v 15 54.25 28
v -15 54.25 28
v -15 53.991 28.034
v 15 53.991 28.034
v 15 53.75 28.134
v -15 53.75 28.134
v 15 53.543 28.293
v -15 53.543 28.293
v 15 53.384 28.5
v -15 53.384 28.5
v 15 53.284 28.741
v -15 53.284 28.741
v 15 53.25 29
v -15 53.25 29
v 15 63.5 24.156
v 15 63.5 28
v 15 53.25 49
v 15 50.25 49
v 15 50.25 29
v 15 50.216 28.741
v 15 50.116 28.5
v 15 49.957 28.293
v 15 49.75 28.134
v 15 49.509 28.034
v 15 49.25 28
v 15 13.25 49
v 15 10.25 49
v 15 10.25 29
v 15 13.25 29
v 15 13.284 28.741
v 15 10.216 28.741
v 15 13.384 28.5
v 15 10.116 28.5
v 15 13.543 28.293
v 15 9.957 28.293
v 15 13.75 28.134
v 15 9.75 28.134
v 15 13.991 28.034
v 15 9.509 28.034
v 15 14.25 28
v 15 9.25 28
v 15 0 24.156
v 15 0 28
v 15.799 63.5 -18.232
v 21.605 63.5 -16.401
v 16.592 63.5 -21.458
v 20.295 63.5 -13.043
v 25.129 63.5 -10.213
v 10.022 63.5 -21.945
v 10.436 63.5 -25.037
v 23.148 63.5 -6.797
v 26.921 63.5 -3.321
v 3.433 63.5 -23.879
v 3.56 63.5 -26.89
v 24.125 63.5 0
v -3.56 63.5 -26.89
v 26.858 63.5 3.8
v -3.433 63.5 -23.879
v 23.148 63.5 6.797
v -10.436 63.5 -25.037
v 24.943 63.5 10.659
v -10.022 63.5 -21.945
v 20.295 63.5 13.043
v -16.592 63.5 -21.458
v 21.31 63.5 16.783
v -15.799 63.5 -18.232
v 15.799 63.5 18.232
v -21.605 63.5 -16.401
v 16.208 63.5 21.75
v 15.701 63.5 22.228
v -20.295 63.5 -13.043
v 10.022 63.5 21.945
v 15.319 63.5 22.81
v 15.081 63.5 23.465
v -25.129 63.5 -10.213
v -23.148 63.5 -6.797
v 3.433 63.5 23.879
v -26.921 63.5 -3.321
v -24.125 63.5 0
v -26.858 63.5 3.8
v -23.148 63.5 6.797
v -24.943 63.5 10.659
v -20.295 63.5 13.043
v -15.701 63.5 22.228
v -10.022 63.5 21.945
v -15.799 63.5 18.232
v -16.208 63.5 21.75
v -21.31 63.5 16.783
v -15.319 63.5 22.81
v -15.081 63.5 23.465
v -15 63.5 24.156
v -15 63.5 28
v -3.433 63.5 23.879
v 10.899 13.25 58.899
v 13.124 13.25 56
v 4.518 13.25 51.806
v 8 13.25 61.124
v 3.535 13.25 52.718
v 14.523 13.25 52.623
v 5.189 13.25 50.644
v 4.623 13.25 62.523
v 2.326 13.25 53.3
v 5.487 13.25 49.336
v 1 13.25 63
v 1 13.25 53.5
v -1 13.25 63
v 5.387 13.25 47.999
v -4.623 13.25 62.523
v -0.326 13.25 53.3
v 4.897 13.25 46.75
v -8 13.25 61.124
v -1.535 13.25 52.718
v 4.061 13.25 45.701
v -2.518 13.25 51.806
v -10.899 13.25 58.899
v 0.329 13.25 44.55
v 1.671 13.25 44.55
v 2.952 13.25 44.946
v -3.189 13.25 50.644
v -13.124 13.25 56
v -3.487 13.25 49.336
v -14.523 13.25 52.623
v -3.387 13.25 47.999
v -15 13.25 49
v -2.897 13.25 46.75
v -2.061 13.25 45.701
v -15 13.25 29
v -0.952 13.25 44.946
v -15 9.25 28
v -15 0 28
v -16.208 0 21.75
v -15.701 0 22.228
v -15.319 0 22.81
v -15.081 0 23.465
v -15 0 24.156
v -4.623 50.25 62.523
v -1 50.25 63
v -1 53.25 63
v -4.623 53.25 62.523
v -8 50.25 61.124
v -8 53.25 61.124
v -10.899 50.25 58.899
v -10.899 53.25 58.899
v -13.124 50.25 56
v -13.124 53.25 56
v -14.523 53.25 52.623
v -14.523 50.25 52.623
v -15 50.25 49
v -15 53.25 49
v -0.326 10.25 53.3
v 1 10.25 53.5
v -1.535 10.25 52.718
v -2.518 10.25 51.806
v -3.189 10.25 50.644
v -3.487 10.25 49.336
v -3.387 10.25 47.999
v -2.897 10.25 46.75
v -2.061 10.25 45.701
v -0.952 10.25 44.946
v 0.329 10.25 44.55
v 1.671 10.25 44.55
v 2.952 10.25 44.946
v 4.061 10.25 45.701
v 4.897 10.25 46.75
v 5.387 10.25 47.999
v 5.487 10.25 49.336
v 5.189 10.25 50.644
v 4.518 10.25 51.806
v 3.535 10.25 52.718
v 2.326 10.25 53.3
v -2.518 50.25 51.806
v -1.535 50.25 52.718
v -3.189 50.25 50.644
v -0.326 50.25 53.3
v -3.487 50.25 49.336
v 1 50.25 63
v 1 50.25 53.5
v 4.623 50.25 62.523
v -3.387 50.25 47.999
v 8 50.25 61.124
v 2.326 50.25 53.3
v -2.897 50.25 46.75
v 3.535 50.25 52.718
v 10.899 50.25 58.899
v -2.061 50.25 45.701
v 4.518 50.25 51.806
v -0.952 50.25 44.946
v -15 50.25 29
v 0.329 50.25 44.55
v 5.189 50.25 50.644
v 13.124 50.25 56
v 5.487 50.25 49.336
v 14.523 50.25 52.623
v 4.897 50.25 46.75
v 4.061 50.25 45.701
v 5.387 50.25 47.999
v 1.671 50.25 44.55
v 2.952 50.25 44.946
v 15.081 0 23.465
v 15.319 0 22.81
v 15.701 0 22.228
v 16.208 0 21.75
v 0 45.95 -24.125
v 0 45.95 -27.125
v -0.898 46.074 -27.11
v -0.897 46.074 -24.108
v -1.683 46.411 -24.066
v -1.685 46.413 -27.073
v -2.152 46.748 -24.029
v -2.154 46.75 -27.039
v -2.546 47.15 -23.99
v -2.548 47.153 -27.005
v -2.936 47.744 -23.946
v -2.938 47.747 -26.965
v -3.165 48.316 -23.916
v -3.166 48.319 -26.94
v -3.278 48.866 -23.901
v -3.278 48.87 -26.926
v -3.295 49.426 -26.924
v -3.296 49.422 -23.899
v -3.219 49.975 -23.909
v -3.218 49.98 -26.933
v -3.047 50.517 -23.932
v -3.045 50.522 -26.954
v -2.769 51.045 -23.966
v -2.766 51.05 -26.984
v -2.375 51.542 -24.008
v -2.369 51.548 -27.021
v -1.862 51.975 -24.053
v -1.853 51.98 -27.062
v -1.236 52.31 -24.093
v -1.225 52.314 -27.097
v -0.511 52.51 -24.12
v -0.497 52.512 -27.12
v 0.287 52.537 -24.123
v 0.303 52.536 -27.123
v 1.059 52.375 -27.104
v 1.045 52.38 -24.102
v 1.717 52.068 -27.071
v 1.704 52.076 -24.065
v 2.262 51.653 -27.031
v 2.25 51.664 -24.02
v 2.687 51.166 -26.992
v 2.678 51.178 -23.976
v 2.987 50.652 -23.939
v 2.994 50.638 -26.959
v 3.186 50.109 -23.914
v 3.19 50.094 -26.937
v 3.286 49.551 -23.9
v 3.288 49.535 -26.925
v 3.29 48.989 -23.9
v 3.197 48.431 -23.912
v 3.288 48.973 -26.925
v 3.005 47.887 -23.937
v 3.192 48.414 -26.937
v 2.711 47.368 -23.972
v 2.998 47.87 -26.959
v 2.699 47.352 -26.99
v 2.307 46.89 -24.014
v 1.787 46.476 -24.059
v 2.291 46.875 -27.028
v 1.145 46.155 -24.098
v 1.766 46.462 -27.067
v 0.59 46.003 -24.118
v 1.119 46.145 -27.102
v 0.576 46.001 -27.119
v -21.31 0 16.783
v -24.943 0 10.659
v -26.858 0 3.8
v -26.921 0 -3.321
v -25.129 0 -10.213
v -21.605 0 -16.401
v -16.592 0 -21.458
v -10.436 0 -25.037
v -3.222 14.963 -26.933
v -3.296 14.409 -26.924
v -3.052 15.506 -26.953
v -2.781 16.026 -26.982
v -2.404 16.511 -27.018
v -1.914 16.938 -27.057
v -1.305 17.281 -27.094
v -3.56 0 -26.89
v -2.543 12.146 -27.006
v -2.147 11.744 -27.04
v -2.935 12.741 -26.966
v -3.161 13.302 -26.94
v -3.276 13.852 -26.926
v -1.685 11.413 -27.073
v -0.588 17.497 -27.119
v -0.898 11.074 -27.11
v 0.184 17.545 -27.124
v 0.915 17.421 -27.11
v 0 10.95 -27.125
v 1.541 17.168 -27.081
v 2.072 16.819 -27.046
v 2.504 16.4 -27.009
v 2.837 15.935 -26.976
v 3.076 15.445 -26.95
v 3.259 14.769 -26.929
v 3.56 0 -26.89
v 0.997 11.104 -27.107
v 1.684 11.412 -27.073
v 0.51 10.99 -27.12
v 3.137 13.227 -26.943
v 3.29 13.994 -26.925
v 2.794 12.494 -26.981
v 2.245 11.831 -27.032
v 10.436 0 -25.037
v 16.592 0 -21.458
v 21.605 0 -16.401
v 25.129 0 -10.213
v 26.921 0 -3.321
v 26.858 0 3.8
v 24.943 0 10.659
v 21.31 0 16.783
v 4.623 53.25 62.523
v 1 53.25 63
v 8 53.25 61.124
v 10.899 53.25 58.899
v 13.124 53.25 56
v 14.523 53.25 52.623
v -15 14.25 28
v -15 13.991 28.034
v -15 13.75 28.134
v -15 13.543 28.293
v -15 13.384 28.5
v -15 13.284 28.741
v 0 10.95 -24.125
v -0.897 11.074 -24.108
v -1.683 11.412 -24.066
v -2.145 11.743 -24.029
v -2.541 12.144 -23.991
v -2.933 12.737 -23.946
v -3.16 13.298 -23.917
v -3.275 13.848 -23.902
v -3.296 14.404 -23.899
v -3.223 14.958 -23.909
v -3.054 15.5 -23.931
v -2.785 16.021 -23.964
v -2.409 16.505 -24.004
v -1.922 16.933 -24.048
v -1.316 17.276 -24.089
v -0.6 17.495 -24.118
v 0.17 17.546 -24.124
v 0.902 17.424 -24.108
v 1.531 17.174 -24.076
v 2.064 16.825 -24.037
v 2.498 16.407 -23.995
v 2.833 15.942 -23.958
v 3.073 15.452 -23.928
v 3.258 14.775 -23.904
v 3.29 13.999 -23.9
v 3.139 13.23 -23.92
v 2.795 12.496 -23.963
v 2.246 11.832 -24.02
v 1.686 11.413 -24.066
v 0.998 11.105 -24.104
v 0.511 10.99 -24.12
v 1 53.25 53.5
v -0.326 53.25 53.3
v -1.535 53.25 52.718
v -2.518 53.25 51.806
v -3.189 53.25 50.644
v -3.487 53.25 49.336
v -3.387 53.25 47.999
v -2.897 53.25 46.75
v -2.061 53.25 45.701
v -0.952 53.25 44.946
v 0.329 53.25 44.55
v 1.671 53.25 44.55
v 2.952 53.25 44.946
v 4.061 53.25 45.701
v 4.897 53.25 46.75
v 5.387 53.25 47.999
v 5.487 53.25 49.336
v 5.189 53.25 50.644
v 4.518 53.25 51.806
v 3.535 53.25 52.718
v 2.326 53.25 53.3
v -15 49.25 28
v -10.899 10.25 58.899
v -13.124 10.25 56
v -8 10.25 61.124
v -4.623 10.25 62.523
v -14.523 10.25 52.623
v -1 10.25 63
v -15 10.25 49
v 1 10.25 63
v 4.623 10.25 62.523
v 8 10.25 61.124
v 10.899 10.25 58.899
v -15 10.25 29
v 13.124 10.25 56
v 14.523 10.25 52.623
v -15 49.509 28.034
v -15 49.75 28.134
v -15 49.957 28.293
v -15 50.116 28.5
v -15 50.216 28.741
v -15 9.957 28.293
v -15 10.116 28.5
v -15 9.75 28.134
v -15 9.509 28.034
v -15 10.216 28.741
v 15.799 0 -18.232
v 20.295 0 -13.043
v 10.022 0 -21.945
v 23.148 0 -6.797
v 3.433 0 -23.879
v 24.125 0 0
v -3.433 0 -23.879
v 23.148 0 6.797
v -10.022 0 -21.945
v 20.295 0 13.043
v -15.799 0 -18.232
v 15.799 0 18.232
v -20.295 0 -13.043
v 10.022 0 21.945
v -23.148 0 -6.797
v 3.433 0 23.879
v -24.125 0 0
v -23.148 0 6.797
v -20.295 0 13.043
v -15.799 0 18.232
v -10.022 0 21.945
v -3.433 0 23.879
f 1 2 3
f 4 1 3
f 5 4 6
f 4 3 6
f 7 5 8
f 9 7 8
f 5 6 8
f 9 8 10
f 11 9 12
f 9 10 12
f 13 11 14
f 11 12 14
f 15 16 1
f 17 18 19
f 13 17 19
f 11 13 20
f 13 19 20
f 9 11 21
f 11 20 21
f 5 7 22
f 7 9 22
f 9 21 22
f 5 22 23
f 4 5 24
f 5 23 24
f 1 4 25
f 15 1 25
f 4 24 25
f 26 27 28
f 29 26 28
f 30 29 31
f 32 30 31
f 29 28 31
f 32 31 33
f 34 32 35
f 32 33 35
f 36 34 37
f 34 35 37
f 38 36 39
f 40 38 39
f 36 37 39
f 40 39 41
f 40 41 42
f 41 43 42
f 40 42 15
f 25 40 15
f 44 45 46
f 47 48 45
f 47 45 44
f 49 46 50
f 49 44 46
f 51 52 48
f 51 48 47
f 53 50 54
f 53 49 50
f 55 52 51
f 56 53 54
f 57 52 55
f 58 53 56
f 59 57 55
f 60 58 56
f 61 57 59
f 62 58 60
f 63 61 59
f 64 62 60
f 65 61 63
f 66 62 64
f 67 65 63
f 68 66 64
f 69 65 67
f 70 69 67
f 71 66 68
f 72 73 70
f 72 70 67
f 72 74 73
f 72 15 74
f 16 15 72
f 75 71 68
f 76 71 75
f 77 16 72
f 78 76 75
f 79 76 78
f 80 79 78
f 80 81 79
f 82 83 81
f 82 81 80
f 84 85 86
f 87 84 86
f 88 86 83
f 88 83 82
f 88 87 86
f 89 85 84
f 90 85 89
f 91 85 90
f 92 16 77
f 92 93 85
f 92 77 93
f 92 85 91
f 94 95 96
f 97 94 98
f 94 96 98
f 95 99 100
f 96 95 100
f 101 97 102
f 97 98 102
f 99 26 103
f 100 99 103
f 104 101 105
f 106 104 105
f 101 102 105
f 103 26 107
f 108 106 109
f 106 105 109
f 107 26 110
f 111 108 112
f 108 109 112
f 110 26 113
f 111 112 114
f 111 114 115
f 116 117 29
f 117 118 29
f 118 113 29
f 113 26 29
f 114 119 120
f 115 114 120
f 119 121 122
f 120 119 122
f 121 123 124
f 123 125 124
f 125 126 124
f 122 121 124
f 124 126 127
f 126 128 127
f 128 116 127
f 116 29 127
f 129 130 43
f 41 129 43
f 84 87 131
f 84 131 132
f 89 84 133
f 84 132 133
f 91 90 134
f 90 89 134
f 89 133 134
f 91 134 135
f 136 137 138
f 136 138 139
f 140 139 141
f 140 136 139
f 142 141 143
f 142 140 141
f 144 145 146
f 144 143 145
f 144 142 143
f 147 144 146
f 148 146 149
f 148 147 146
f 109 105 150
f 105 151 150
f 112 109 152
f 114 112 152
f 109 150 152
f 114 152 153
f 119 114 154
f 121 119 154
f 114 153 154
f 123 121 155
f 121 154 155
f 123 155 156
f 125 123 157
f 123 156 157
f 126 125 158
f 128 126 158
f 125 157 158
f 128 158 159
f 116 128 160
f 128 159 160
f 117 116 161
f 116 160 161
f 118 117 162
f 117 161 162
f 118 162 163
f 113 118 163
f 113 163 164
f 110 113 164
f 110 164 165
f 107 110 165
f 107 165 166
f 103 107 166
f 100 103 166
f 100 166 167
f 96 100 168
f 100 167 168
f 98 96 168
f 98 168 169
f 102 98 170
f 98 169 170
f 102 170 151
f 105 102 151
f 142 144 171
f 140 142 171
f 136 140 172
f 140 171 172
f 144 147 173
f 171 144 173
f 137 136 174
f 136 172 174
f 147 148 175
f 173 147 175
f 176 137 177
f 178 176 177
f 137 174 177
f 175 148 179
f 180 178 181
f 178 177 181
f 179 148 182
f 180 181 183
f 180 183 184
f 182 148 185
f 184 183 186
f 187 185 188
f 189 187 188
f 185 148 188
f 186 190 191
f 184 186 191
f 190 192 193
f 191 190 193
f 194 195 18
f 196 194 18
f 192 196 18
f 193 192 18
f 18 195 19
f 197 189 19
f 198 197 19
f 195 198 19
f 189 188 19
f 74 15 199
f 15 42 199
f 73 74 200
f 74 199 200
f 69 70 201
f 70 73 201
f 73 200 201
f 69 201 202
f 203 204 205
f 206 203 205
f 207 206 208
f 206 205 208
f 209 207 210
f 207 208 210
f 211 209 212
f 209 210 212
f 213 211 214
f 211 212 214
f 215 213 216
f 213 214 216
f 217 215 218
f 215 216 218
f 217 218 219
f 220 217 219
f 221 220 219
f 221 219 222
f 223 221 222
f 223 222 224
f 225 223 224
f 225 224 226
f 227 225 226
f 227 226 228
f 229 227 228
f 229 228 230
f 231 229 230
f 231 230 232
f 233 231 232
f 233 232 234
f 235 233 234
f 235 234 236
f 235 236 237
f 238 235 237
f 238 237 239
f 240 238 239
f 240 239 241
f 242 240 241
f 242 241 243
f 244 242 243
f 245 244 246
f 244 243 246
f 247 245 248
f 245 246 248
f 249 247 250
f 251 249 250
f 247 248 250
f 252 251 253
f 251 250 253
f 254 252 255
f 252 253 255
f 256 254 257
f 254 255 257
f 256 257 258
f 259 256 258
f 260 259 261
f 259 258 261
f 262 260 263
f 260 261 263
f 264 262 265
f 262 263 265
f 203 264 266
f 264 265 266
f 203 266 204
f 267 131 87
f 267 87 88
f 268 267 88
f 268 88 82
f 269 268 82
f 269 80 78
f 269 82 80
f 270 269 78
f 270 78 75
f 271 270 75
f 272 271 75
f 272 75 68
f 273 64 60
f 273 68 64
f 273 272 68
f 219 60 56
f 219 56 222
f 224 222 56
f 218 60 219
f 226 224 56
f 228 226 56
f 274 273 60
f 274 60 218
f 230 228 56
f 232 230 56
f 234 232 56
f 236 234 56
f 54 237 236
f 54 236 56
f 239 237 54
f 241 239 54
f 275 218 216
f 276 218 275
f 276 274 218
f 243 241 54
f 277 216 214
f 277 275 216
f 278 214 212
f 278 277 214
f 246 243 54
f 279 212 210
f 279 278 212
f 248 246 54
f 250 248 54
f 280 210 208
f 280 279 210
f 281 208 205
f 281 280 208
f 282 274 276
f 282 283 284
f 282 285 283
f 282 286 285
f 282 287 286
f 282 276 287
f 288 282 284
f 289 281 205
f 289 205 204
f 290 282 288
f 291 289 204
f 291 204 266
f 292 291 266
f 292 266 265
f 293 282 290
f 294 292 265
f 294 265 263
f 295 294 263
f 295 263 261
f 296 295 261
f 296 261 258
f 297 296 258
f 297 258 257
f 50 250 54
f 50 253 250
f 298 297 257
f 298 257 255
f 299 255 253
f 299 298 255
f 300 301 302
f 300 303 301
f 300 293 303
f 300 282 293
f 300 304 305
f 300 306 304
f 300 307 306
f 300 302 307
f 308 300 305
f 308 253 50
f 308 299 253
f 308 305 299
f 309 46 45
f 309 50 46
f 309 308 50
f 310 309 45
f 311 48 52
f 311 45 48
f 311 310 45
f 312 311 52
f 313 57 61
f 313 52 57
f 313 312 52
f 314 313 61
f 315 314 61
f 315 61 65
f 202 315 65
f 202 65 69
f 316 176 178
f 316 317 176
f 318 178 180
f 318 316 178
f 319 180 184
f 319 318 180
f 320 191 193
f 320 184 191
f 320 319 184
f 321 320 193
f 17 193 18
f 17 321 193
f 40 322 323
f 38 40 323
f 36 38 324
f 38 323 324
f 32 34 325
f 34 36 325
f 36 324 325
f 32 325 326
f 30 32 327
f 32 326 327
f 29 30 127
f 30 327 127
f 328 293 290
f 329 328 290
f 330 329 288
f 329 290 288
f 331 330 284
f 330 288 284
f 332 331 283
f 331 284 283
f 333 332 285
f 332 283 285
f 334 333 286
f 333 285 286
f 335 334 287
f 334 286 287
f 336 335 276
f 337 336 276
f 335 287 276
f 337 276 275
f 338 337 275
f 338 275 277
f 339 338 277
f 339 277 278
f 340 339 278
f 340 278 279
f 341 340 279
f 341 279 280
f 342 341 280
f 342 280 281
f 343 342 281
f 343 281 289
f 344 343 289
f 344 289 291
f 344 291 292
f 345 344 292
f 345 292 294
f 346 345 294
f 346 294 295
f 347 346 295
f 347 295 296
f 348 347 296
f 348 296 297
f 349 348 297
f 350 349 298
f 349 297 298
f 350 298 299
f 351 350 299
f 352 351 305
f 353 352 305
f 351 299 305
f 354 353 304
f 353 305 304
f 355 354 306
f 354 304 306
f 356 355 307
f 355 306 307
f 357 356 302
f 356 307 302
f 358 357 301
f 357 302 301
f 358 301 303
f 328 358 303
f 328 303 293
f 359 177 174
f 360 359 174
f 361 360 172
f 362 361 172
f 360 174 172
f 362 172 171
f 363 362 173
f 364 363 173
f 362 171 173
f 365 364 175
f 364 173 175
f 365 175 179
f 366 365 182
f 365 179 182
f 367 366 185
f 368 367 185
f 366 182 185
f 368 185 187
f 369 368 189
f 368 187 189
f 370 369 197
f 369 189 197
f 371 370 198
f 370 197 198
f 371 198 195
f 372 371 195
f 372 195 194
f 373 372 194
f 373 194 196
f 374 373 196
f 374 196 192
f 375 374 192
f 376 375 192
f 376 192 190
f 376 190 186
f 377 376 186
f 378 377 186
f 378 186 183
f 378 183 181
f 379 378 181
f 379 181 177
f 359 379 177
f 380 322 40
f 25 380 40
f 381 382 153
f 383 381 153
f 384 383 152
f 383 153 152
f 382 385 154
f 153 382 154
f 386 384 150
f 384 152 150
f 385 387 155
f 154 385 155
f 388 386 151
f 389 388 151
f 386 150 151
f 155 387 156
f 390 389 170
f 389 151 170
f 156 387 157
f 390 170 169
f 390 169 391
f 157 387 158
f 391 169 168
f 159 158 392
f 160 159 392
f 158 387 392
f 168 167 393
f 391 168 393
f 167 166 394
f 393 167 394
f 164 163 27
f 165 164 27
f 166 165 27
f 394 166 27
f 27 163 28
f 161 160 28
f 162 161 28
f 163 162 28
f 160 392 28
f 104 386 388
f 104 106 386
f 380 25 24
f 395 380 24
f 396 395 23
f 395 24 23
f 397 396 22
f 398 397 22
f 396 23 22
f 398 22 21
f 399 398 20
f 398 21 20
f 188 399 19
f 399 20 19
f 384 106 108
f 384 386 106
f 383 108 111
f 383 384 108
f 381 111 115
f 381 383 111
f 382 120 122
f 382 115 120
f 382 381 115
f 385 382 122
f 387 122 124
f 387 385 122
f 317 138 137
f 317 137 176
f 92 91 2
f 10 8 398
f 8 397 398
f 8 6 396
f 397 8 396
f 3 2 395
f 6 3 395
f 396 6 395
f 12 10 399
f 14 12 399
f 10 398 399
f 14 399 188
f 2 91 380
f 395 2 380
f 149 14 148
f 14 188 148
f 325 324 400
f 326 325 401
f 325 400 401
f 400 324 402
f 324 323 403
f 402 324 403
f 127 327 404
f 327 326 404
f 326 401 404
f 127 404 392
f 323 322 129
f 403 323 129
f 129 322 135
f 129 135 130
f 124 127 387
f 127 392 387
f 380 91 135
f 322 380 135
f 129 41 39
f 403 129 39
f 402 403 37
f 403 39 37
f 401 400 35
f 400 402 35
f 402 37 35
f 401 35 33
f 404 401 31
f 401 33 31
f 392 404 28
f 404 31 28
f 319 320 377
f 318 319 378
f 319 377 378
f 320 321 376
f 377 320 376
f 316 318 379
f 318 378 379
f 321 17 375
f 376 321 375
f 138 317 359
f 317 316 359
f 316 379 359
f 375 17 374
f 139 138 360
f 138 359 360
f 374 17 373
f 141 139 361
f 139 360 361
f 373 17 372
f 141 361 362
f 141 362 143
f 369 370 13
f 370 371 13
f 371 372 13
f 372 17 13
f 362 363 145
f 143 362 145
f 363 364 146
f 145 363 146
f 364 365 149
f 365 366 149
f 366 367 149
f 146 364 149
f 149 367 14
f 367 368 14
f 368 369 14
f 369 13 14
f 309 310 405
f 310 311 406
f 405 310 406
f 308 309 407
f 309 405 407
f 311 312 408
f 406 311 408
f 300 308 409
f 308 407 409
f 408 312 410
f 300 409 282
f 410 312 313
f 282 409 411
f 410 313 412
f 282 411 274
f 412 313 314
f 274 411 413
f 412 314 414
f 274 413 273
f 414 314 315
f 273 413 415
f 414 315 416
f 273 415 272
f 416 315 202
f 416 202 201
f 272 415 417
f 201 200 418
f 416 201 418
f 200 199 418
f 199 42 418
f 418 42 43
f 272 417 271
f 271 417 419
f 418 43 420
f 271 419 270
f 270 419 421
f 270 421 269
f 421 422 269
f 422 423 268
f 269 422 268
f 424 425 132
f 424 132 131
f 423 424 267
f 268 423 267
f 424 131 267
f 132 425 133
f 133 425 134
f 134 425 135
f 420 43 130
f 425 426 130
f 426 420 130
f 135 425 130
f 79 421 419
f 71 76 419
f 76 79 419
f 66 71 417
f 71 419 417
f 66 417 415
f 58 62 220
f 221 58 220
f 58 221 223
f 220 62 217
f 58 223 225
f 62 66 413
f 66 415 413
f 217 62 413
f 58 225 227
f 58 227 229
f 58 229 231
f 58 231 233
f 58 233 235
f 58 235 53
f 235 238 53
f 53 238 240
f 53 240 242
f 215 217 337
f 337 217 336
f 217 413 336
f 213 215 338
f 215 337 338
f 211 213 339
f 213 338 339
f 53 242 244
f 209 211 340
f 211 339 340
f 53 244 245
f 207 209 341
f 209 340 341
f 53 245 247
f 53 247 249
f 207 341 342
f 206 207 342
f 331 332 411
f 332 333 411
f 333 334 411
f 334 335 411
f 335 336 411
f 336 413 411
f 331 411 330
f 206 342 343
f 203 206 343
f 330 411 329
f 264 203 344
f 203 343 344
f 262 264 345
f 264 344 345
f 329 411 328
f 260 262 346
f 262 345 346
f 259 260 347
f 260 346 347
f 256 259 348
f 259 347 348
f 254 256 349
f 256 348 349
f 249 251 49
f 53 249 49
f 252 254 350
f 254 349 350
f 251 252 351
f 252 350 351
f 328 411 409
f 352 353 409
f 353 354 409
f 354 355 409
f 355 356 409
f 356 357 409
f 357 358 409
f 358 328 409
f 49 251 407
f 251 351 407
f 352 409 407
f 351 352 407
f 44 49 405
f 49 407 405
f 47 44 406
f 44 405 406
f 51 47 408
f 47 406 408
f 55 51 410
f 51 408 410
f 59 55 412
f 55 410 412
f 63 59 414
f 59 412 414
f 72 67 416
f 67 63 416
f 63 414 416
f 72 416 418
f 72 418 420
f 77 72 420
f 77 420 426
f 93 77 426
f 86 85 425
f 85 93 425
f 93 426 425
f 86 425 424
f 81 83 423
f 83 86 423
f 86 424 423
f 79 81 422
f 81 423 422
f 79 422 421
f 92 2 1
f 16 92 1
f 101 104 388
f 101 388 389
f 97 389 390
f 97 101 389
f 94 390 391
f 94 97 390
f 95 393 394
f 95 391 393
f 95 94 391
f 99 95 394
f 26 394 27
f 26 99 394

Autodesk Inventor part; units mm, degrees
ref_plane "YZ Plane" through (0, 0, 0) normal (1, 0, 0) x (0, 1, 0)
ref_plane "XZ Plane" through (0, 0, 0) normal (0, 1, 0) x (-1, 0, 0)
ref_plane "XY Plane" through (0, 0, 0) normal (0, 0, 1) x (1, 0, 0)
sketch "Sketch1" plane through (0, 0, 0) normal (0, 1, 0) x (-1, 0, 0)
  circle A0 centre (0, 0) radius 24.125
  arc A1 (-16.2075, 21.7505) -> (16.2075, 21.7505) centre (0, 0) ccw
  line L0 (15, 28) -> (-15, 28)
  line L1 (-15, 28) -> (-15, 25.1875)
  line L2 (15, 24.1561) -> (15, 28)
  line L3 (15, 28) -> (-15, 25.1875) construction
  line L4 (-15, 28) -> (15, 24.7857) construction
  line L5 (-15, 25.1875) -> (-15, 24.1561)
  arc A2 (15, 24.1561) -> (16.2075, 21.7505) centre (18, 24.1561) ccw
  arc A3 (-16.2075, 21.7505) -> (-15, 24.1561) centre (-18, 24.1561) ccw
  point P0 (-1, 26.5)
  point P1 (0, 26.3929)
  point P2 (15, 22.6001)
  point P3 (-15, 22.6001)
  dimension "d0" = 48.25
  dimension "d2" = 3
  dimension "d4" = 30
  dimension "d6" = 28
  dimension "d7" = 3
extrude "Extrusion1" add sketch "Sketch1" along normal blind 63.5
sketch "Sketch2" plane through (-15, 0, 28) normal (0, 0, 1) x (1, 0, 0)
  line L0 (30, 0) -> (30, 63.5) projected
  line L1 (0, 50.25) -> (30, 50.25)
  line L2 (30, 50.25) -> (30, 53.25)
  line L3 (30, 53.25) -> (0, 53.25)
  line L4 (0, 53.25) -> (0, 50.25)
  line L5 (0, 50.25) -> (30, 53.25) construction
  line L6 (30, 50.25) -> (0, 53.25) construction
  line L7 (0, 10.25) -> (30, 10.25)
  line L8 (30, 10.25) -> (30, 13.25)
  line L9 (30, 13.25) -> (0, 13.25)
  line L10 (0, 13.25) -> (0, 10.25)
  line L11 (0, 10.25) -> (30, 13.25) construction
  line L12 (30, 10.25) -> (0, 13.25) construction
  line L13 (0, 0) -> (0, 63.5) projected
  line L14 (0, 31.75) -> (30, 31.75) construction
  point P0 (15, 0)
  point P1 (15, 51.75)
  point P2 (15, 11.75)
  dimension "d10" = 3
  dimension "d11" = 3
  dimension "d12" = 40
  dimension "d13" = 20
  dimension "d34" = 30
  dimension "d35" = 30
extrude "Extrusion2" add sketch "Sketch2" along normal blind 35 contours L7 L10 L9 L0 | L1 L4 L3 L0
fillet "Fillet1" radius 14 4 edges at (-15, 51.75, 63) (15, 11.75, 63) (15, 51.75, 63) (-15, 11.75, 63)
sketch "Sketch3" plane through (-15, 53.25, 28) normal (0, 1, 0) x (1, 0, 0)
  arc A0 (0, -21) -> (30, -21) centre (16, -21) ccw projected
  point P0 (15, 28)
hole "Hole1" at (1, 53.25, 49) direction (0, -1, 0) diameter 9 end through all clearance for "Flat Head Machine Screw" size "M8" standard "Ansi Metric M Profile"
fillet "Fillet2" radius 1 4 edges at (0, 53.25, 28) (0, 50.25, 28) (0, 13.25, 28) (0, 10.25, 28)
sketch "Sketch4" plane through (0, 0, 0) normal (0, 0, 1) x (1, 0, 0)
  line L0 (16.2075, 0) -> (16.2075, 63.5) projected
  line L1 (16.2075, 31.75) -> (-16.2075, 31.75)
  line L2 (-16.2075, 0) -> (-16.2075, 63.5) projected
  point P0 (0, 0)
  point P1 (0, 49.25)
  point P2 (0, 14.25)
  point P3 (0, 31.75)
  dimension "d25" = 17.5
  dimension "d26" = 17.5
hole "Hole2" at (0, 49.25, 0) at (0, 14.25, 0) direction (0, 0, -1) diameter 6.6 end through all clearance for "Flat Head Machine Screw" size "M6" standard "Ansi Metric M Profile"
equation "\"d13\" = 0.5 * d12"
equation "\"d25\" = 0.5 * Clamp_Bolt_Space"
equation "\"d26\" = d25"
equation "\"Clamp_Bolt_Space\" = 35"
properties part number "Hanger_Clamp" material "Steel, Carbon"
